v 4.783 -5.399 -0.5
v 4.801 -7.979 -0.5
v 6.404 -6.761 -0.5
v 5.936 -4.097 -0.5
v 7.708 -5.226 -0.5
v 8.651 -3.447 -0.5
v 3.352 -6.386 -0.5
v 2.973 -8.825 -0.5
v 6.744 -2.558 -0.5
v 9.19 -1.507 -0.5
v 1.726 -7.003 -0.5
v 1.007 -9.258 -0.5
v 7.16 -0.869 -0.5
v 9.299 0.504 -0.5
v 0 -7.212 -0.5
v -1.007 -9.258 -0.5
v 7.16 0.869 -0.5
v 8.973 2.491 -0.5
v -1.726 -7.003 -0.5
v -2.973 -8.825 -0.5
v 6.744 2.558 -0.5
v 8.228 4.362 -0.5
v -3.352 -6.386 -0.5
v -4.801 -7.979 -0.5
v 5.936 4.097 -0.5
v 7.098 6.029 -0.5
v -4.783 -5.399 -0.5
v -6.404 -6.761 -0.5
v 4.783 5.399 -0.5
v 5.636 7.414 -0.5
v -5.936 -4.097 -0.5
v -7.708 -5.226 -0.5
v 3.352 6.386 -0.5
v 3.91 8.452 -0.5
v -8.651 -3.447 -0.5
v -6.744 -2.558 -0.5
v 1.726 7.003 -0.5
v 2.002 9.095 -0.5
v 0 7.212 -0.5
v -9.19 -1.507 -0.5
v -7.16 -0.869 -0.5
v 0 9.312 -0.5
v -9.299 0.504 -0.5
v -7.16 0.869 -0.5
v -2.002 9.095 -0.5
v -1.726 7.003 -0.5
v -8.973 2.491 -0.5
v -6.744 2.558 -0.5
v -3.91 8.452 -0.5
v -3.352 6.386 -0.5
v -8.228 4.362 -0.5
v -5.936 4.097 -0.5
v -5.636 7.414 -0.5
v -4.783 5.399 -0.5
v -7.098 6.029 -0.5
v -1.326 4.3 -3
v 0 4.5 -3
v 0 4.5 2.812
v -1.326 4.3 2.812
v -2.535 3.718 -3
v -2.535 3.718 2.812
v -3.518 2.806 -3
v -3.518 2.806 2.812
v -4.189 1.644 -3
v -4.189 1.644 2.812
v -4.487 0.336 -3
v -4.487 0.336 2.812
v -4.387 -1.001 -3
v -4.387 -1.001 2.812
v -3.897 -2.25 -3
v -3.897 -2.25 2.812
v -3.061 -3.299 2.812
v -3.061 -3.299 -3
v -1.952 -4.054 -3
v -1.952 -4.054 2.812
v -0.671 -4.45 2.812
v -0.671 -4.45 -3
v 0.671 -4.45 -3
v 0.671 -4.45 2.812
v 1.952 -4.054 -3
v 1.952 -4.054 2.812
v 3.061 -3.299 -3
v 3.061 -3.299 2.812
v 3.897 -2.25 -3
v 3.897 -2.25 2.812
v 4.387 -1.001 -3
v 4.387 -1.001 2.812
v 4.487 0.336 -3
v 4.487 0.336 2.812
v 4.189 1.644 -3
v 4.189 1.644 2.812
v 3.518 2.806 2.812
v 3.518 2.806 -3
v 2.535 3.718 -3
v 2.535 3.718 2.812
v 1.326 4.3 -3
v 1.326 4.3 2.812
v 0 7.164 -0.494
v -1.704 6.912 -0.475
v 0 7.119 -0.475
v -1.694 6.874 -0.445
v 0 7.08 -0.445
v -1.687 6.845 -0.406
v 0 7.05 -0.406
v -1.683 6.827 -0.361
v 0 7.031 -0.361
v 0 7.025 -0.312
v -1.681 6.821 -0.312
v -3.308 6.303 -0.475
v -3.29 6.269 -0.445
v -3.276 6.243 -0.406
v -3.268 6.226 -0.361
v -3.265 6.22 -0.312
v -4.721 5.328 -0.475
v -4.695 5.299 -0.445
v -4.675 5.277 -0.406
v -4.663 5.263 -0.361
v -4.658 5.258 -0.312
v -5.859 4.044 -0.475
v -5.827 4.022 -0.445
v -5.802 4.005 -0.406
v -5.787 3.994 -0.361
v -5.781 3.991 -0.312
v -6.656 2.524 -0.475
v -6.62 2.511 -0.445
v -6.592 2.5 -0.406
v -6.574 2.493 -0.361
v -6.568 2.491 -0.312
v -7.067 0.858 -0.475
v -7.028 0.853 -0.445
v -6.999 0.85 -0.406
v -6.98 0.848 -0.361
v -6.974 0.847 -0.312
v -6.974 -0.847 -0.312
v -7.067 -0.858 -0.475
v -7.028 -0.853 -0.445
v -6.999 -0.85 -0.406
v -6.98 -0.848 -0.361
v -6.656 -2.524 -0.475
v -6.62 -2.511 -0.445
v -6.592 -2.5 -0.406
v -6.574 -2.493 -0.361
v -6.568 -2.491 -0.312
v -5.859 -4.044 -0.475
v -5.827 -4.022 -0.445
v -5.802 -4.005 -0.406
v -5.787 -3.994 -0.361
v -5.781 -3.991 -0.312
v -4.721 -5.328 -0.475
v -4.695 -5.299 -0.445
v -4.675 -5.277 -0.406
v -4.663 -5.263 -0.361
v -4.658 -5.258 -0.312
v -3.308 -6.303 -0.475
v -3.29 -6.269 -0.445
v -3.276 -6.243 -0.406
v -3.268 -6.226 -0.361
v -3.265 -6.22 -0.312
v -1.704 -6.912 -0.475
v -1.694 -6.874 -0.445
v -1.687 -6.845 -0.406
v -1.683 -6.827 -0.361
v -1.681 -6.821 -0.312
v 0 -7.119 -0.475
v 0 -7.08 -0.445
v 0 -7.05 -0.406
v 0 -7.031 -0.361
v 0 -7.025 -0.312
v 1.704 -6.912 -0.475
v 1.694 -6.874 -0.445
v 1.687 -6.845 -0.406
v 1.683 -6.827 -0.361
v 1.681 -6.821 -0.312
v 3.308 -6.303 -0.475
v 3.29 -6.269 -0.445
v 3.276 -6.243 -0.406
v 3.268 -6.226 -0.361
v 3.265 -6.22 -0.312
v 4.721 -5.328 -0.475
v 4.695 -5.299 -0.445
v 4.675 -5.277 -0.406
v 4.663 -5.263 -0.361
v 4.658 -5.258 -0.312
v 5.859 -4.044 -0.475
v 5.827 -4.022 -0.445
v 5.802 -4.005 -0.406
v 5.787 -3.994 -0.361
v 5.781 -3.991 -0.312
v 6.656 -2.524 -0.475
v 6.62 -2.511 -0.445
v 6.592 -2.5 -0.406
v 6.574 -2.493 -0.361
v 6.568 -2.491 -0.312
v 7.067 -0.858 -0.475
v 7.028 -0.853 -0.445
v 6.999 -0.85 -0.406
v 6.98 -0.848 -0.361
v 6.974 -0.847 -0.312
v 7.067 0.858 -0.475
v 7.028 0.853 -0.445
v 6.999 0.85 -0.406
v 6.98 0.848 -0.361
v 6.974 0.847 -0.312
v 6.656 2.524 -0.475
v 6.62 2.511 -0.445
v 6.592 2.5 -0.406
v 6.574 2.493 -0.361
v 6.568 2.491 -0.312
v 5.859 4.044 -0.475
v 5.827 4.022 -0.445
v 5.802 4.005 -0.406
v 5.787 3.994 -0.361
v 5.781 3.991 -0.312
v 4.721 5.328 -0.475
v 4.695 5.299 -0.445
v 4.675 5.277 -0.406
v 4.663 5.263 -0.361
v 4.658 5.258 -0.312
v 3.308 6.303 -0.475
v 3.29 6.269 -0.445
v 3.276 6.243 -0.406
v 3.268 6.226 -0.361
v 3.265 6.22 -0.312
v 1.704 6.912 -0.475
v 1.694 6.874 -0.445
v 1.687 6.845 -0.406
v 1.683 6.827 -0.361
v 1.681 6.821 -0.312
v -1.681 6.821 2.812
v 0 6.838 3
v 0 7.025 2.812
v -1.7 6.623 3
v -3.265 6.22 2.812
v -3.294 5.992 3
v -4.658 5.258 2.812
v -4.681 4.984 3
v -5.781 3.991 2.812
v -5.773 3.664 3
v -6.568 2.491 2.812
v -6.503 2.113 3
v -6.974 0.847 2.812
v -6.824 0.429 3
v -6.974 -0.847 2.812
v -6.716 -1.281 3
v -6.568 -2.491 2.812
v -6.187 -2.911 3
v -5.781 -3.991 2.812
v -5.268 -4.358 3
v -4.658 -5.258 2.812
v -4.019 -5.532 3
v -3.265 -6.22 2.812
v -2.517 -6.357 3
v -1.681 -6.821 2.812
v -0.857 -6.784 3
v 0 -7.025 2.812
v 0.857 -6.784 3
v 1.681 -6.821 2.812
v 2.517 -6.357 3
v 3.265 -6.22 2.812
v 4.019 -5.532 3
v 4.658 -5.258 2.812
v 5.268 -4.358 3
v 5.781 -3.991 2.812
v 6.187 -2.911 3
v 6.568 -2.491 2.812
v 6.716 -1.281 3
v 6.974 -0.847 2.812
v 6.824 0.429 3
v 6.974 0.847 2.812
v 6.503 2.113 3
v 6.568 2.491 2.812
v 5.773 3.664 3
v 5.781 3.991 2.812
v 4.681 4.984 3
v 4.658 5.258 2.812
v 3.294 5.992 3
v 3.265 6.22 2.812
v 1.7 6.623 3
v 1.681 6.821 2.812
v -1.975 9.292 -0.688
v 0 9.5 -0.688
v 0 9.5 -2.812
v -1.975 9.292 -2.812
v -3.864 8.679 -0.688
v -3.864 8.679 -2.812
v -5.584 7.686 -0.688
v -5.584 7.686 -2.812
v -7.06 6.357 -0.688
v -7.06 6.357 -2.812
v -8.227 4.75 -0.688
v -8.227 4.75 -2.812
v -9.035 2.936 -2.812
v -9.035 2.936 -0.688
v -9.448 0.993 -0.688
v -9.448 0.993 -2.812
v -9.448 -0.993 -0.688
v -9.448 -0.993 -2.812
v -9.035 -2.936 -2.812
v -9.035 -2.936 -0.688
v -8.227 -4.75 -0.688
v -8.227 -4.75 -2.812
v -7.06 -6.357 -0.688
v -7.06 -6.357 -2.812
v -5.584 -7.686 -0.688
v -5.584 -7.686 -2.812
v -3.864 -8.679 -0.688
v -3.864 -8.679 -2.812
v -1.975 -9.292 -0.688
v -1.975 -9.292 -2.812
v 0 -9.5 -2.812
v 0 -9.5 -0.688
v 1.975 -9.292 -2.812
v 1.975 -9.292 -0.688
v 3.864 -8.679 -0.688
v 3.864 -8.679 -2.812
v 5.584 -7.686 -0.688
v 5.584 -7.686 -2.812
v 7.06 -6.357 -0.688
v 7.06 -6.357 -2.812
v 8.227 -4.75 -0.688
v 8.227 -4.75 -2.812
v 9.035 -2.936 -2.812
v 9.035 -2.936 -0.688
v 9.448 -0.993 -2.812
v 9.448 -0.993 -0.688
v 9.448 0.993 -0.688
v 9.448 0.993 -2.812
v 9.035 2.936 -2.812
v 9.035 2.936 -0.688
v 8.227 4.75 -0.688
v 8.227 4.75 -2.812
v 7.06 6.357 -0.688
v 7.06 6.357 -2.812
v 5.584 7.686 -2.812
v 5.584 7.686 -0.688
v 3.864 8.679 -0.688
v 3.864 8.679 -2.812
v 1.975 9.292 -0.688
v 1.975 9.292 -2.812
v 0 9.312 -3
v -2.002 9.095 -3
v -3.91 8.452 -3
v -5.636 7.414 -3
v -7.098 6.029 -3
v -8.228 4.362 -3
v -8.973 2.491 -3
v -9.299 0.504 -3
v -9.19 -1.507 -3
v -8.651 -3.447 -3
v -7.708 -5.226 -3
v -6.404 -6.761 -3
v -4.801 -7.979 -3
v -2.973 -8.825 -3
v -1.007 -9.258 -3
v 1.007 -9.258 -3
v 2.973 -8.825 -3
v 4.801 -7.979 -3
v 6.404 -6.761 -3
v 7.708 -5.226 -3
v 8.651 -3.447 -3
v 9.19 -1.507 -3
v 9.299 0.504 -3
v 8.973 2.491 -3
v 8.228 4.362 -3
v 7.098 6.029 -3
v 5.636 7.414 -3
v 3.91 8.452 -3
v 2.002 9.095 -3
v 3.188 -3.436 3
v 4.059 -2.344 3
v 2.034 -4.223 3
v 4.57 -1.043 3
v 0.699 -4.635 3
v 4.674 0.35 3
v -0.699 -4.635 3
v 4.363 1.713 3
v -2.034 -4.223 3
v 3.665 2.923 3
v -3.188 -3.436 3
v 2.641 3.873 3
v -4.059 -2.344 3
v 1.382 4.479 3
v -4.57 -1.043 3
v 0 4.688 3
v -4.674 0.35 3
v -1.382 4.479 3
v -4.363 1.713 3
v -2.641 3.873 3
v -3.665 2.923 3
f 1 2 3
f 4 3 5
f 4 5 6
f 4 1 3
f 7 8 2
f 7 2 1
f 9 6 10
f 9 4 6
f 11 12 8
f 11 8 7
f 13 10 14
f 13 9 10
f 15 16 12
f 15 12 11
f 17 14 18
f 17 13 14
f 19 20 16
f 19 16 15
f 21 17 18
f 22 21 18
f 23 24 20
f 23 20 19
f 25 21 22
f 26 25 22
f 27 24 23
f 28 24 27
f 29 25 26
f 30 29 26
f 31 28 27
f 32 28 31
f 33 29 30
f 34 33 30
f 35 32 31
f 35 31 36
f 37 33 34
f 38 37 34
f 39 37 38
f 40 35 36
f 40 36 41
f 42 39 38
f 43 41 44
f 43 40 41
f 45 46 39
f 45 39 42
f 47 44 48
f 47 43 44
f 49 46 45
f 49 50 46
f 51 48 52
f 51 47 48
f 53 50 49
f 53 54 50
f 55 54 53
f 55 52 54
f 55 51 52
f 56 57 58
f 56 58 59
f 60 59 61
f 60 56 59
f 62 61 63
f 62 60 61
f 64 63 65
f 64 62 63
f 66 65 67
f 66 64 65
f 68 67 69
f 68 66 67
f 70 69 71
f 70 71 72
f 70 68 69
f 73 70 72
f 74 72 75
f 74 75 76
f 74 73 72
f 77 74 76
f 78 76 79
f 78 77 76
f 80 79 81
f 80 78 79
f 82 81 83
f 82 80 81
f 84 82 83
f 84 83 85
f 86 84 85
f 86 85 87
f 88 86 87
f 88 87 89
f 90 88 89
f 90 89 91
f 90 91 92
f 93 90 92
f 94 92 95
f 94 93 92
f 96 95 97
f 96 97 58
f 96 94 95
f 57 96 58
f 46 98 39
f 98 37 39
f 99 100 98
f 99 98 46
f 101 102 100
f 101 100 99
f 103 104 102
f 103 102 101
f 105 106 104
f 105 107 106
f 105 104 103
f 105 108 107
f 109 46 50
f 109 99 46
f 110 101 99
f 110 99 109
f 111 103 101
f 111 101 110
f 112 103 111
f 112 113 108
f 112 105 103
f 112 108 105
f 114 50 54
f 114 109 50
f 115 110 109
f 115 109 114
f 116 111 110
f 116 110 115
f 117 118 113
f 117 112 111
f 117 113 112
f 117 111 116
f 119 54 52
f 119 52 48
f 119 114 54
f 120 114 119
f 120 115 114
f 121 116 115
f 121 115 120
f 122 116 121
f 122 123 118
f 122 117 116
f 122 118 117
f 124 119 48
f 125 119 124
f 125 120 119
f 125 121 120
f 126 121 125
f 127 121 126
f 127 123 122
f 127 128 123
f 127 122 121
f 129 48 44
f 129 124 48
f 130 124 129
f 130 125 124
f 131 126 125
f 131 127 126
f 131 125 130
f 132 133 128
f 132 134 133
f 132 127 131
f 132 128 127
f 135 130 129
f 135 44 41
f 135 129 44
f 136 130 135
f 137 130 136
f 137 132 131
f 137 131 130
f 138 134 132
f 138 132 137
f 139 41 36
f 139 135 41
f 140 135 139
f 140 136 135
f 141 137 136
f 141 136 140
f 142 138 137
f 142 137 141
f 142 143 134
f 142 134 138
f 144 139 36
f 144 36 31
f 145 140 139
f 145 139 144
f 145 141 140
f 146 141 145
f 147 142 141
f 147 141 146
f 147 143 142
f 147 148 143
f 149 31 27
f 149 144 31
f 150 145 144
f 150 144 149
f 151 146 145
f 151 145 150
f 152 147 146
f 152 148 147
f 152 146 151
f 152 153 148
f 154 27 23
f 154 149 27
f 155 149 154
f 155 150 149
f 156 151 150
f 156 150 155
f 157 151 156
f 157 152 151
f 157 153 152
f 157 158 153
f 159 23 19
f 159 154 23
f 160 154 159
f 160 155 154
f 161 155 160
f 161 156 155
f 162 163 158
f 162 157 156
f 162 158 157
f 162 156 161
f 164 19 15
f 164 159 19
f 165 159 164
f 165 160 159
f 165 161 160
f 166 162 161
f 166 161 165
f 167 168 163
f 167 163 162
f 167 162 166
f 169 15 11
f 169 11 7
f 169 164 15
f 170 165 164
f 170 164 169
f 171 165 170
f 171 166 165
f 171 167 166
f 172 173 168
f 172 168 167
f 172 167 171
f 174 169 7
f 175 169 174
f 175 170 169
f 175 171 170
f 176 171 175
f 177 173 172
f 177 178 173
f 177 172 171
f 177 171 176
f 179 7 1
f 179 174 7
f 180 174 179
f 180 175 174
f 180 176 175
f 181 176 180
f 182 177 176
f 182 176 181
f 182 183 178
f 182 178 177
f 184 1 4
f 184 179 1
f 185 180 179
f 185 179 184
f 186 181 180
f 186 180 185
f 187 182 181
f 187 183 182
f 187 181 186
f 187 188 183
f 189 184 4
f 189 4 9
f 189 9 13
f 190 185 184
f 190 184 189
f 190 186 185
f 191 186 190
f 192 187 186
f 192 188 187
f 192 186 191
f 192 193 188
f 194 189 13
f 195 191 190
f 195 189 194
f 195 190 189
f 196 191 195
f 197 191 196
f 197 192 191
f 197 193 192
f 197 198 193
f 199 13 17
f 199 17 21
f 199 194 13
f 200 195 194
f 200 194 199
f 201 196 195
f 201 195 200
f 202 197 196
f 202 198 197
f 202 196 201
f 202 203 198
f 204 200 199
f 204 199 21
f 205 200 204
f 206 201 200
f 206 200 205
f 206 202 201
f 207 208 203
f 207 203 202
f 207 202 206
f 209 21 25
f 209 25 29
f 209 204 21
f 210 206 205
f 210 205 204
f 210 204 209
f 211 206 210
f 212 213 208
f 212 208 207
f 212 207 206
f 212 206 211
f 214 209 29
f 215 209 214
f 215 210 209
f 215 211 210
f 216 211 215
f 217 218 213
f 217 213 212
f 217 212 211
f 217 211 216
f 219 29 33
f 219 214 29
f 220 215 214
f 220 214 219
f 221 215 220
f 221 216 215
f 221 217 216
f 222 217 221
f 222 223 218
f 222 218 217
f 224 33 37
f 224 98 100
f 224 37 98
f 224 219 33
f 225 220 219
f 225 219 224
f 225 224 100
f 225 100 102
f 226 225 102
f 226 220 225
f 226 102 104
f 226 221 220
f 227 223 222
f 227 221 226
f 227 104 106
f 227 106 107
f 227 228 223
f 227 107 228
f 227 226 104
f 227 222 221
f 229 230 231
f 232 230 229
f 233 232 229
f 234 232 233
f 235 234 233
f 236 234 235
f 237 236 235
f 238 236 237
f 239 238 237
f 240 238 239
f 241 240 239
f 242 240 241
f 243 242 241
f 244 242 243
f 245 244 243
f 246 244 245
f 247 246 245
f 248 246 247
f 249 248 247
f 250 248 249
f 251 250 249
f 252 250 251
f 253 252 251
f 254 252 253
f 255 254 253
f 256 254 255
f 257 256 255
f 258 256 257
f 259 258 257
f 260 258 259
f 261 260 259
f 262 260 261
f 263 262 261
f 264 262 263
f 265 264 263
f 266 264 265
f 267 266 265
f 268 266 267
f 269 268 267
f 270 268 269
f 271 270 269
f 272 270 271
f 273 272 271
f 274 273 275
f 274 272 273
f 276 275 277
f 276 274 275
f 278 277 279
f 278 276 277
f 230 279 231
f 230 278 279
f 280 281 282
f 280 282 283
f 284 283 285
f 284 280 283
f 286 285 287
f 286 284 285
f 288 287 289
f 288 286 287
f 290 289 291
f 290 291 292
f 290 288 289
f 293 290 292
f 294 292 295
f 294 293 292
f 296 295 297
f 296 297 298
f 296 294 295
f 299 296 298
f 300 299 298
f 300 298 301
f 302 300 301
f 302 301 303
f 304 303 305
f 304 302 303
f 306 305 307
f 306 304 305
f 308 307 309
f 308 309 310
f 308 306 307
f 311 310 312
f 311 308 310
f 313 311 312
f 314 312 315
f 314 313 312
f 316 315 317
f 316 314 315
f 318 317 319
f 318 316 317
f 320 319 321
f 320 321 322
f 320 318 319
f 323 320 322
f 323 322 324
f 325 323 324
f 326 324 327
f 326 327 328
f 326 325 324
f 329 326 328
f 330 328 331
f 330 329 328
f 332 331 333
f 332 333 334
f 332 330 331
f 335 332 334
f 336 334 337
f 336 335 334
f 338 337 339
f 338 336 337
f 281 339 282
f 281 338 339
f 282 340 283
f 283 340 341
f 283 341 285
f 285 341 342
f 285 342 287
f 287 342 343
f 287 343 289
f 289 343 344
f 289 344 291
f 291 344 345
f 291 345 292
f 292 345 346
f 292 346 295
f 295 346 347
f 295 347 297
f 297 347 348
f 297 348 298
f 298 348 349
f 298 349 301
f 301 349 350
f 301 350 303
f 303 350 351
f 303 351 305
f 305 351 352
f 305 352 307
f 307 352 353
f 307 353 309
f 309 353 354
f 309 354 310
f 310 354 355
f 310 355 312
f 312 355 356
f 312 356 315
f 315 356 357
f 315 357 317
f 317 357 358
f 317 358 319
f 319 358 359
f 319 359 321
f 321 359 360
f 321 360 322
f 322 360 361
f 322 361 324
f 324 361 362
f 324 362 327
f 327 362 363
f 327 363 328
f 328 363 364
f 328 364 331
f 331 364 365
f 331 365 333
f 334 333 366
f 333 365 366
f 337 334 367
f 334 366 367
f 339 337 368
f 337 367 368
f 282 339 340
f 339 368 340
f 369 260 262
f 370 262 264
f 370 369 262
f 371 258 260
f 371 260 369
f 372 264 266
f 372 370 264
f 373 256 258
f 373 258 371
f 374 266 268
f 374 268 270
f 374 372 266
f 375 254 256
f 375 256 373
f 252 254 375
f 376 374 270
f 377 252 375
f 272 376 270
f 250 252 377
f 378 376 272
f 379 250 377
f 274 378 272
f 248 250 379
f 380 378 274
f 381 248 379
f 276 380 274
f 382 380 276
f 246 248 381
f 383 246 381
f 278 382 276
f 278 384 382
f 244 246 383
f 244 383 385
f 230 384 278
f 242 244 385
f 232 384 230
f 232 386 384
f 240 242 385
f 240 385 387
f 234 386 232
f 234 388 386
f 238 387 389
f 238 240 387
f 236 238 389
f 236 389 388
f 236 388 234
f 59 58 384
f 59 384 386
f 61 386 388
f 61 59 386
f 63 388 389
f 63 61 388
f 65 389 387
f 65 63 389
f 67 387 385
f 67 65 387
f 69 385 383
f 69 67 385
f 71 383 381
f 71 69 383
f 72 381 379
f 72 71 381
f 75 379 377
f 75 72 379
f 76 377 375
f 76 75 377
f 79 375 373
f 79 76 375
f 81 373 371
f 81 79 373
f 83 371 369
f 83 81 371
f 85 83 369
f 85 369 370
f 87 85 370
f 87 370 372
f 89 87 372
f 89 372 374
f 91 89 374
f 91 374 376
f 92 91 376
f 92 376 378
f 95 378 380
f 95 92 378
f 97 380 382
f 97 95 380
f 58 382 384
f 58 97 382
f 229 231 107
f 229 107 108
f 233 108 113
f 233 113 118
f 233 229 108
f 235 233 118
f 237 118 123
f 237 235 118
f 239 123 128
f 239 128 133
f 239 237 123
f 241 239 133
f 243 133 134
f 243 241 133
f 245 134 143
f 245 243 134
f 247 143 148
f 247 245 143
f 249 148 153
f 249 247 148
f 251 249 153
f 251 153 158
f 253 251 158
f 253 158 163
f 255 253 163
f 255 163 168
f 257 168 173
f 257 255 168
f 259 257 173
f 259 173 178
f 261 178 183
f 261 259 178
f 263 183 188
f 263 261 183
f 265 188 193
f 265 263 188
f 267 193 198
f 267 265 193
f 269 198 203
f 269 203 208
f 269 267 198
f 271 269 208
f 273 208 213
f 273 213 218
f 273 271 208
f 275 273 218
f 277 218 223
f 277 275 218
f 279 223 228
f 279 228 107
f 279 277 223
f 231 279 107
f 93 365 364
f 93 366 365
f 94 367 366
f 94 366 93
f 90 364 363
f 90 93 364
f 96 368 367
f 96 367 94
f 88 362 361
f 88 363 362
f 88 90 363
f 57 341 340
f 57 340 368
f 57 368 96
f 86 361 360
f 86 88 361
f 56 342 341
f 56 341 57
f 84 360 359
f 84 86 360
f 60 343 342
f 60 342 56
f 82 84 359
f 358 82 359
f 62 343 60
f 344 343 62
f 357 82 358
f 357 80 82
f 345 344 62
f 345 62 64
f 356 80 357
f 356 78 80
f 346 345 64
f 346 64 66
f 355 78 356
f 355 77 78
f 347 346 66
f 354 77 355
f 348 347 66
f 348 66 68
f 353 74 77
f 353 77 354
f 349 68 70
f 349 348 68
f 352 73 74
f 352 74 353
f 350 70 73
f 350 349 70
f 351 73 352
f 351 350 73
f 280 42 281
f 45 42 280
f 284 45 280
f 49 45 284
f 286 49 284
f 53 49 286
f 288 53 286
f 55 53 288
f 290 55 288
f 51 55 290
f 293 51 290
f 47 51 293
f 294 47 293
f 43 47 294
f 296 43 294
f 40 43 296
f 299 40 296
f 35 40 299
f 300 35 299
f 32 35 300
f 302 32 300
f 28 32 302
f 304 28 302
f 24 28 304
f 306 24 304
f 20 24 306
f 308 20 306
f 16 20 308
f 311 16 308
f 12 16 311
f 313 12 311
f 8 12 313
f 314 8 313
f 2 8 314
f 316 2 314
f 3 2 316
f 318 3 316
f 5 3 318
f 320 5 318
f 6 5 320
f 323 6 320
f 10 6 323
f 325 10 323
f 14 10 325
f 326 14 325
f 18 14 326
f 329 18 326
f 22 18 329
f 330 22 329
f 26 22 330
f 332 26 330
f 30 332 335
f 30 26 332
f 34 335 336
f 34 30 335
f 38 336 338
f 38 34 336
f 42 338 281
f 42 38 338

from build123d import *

# Parameters (mm, degrees)
CHAMFER1_SIZE = 0.1875
FILLET1_R     = 0.1875


with BuildPart() as part:
    # Sketch3 → Revolve1 (revolve)
    with BuildSketch(Plane(origin=(0, 0, 0), x_dir=(0, 0, -1), z_dir=(1, 0, 0))):
        Polygon((3, 9.5), (0.5, 9.5), (0.5, 7.025), (-3, 7.025), (-3, 4.5), (3, 4.5), align=None)
    revolve(axis=Axis((0, 0, -3), (0, 0, 1)))

    # Chamfer1
    chamfer1_edges = [part.edges().sort_by_distance(p)[0] for p in [
        (0, -4.5, 3),
        (0, -7.025, 3),
        (0, -9.5, -0.5),
        (0, -9.5, -3),
    ]]
    chamfer(chamfer1_edges, length=CHAMFER1_SIZE)

    # Fillet1
    fillet1_edges = [part.edges().sort_by_distance(p)[0] for p in [
        (0, -7.025, -0.5),
    ]]
    fillet(fillet1_edges, radius=FILLET1_R)


solid = part.part
